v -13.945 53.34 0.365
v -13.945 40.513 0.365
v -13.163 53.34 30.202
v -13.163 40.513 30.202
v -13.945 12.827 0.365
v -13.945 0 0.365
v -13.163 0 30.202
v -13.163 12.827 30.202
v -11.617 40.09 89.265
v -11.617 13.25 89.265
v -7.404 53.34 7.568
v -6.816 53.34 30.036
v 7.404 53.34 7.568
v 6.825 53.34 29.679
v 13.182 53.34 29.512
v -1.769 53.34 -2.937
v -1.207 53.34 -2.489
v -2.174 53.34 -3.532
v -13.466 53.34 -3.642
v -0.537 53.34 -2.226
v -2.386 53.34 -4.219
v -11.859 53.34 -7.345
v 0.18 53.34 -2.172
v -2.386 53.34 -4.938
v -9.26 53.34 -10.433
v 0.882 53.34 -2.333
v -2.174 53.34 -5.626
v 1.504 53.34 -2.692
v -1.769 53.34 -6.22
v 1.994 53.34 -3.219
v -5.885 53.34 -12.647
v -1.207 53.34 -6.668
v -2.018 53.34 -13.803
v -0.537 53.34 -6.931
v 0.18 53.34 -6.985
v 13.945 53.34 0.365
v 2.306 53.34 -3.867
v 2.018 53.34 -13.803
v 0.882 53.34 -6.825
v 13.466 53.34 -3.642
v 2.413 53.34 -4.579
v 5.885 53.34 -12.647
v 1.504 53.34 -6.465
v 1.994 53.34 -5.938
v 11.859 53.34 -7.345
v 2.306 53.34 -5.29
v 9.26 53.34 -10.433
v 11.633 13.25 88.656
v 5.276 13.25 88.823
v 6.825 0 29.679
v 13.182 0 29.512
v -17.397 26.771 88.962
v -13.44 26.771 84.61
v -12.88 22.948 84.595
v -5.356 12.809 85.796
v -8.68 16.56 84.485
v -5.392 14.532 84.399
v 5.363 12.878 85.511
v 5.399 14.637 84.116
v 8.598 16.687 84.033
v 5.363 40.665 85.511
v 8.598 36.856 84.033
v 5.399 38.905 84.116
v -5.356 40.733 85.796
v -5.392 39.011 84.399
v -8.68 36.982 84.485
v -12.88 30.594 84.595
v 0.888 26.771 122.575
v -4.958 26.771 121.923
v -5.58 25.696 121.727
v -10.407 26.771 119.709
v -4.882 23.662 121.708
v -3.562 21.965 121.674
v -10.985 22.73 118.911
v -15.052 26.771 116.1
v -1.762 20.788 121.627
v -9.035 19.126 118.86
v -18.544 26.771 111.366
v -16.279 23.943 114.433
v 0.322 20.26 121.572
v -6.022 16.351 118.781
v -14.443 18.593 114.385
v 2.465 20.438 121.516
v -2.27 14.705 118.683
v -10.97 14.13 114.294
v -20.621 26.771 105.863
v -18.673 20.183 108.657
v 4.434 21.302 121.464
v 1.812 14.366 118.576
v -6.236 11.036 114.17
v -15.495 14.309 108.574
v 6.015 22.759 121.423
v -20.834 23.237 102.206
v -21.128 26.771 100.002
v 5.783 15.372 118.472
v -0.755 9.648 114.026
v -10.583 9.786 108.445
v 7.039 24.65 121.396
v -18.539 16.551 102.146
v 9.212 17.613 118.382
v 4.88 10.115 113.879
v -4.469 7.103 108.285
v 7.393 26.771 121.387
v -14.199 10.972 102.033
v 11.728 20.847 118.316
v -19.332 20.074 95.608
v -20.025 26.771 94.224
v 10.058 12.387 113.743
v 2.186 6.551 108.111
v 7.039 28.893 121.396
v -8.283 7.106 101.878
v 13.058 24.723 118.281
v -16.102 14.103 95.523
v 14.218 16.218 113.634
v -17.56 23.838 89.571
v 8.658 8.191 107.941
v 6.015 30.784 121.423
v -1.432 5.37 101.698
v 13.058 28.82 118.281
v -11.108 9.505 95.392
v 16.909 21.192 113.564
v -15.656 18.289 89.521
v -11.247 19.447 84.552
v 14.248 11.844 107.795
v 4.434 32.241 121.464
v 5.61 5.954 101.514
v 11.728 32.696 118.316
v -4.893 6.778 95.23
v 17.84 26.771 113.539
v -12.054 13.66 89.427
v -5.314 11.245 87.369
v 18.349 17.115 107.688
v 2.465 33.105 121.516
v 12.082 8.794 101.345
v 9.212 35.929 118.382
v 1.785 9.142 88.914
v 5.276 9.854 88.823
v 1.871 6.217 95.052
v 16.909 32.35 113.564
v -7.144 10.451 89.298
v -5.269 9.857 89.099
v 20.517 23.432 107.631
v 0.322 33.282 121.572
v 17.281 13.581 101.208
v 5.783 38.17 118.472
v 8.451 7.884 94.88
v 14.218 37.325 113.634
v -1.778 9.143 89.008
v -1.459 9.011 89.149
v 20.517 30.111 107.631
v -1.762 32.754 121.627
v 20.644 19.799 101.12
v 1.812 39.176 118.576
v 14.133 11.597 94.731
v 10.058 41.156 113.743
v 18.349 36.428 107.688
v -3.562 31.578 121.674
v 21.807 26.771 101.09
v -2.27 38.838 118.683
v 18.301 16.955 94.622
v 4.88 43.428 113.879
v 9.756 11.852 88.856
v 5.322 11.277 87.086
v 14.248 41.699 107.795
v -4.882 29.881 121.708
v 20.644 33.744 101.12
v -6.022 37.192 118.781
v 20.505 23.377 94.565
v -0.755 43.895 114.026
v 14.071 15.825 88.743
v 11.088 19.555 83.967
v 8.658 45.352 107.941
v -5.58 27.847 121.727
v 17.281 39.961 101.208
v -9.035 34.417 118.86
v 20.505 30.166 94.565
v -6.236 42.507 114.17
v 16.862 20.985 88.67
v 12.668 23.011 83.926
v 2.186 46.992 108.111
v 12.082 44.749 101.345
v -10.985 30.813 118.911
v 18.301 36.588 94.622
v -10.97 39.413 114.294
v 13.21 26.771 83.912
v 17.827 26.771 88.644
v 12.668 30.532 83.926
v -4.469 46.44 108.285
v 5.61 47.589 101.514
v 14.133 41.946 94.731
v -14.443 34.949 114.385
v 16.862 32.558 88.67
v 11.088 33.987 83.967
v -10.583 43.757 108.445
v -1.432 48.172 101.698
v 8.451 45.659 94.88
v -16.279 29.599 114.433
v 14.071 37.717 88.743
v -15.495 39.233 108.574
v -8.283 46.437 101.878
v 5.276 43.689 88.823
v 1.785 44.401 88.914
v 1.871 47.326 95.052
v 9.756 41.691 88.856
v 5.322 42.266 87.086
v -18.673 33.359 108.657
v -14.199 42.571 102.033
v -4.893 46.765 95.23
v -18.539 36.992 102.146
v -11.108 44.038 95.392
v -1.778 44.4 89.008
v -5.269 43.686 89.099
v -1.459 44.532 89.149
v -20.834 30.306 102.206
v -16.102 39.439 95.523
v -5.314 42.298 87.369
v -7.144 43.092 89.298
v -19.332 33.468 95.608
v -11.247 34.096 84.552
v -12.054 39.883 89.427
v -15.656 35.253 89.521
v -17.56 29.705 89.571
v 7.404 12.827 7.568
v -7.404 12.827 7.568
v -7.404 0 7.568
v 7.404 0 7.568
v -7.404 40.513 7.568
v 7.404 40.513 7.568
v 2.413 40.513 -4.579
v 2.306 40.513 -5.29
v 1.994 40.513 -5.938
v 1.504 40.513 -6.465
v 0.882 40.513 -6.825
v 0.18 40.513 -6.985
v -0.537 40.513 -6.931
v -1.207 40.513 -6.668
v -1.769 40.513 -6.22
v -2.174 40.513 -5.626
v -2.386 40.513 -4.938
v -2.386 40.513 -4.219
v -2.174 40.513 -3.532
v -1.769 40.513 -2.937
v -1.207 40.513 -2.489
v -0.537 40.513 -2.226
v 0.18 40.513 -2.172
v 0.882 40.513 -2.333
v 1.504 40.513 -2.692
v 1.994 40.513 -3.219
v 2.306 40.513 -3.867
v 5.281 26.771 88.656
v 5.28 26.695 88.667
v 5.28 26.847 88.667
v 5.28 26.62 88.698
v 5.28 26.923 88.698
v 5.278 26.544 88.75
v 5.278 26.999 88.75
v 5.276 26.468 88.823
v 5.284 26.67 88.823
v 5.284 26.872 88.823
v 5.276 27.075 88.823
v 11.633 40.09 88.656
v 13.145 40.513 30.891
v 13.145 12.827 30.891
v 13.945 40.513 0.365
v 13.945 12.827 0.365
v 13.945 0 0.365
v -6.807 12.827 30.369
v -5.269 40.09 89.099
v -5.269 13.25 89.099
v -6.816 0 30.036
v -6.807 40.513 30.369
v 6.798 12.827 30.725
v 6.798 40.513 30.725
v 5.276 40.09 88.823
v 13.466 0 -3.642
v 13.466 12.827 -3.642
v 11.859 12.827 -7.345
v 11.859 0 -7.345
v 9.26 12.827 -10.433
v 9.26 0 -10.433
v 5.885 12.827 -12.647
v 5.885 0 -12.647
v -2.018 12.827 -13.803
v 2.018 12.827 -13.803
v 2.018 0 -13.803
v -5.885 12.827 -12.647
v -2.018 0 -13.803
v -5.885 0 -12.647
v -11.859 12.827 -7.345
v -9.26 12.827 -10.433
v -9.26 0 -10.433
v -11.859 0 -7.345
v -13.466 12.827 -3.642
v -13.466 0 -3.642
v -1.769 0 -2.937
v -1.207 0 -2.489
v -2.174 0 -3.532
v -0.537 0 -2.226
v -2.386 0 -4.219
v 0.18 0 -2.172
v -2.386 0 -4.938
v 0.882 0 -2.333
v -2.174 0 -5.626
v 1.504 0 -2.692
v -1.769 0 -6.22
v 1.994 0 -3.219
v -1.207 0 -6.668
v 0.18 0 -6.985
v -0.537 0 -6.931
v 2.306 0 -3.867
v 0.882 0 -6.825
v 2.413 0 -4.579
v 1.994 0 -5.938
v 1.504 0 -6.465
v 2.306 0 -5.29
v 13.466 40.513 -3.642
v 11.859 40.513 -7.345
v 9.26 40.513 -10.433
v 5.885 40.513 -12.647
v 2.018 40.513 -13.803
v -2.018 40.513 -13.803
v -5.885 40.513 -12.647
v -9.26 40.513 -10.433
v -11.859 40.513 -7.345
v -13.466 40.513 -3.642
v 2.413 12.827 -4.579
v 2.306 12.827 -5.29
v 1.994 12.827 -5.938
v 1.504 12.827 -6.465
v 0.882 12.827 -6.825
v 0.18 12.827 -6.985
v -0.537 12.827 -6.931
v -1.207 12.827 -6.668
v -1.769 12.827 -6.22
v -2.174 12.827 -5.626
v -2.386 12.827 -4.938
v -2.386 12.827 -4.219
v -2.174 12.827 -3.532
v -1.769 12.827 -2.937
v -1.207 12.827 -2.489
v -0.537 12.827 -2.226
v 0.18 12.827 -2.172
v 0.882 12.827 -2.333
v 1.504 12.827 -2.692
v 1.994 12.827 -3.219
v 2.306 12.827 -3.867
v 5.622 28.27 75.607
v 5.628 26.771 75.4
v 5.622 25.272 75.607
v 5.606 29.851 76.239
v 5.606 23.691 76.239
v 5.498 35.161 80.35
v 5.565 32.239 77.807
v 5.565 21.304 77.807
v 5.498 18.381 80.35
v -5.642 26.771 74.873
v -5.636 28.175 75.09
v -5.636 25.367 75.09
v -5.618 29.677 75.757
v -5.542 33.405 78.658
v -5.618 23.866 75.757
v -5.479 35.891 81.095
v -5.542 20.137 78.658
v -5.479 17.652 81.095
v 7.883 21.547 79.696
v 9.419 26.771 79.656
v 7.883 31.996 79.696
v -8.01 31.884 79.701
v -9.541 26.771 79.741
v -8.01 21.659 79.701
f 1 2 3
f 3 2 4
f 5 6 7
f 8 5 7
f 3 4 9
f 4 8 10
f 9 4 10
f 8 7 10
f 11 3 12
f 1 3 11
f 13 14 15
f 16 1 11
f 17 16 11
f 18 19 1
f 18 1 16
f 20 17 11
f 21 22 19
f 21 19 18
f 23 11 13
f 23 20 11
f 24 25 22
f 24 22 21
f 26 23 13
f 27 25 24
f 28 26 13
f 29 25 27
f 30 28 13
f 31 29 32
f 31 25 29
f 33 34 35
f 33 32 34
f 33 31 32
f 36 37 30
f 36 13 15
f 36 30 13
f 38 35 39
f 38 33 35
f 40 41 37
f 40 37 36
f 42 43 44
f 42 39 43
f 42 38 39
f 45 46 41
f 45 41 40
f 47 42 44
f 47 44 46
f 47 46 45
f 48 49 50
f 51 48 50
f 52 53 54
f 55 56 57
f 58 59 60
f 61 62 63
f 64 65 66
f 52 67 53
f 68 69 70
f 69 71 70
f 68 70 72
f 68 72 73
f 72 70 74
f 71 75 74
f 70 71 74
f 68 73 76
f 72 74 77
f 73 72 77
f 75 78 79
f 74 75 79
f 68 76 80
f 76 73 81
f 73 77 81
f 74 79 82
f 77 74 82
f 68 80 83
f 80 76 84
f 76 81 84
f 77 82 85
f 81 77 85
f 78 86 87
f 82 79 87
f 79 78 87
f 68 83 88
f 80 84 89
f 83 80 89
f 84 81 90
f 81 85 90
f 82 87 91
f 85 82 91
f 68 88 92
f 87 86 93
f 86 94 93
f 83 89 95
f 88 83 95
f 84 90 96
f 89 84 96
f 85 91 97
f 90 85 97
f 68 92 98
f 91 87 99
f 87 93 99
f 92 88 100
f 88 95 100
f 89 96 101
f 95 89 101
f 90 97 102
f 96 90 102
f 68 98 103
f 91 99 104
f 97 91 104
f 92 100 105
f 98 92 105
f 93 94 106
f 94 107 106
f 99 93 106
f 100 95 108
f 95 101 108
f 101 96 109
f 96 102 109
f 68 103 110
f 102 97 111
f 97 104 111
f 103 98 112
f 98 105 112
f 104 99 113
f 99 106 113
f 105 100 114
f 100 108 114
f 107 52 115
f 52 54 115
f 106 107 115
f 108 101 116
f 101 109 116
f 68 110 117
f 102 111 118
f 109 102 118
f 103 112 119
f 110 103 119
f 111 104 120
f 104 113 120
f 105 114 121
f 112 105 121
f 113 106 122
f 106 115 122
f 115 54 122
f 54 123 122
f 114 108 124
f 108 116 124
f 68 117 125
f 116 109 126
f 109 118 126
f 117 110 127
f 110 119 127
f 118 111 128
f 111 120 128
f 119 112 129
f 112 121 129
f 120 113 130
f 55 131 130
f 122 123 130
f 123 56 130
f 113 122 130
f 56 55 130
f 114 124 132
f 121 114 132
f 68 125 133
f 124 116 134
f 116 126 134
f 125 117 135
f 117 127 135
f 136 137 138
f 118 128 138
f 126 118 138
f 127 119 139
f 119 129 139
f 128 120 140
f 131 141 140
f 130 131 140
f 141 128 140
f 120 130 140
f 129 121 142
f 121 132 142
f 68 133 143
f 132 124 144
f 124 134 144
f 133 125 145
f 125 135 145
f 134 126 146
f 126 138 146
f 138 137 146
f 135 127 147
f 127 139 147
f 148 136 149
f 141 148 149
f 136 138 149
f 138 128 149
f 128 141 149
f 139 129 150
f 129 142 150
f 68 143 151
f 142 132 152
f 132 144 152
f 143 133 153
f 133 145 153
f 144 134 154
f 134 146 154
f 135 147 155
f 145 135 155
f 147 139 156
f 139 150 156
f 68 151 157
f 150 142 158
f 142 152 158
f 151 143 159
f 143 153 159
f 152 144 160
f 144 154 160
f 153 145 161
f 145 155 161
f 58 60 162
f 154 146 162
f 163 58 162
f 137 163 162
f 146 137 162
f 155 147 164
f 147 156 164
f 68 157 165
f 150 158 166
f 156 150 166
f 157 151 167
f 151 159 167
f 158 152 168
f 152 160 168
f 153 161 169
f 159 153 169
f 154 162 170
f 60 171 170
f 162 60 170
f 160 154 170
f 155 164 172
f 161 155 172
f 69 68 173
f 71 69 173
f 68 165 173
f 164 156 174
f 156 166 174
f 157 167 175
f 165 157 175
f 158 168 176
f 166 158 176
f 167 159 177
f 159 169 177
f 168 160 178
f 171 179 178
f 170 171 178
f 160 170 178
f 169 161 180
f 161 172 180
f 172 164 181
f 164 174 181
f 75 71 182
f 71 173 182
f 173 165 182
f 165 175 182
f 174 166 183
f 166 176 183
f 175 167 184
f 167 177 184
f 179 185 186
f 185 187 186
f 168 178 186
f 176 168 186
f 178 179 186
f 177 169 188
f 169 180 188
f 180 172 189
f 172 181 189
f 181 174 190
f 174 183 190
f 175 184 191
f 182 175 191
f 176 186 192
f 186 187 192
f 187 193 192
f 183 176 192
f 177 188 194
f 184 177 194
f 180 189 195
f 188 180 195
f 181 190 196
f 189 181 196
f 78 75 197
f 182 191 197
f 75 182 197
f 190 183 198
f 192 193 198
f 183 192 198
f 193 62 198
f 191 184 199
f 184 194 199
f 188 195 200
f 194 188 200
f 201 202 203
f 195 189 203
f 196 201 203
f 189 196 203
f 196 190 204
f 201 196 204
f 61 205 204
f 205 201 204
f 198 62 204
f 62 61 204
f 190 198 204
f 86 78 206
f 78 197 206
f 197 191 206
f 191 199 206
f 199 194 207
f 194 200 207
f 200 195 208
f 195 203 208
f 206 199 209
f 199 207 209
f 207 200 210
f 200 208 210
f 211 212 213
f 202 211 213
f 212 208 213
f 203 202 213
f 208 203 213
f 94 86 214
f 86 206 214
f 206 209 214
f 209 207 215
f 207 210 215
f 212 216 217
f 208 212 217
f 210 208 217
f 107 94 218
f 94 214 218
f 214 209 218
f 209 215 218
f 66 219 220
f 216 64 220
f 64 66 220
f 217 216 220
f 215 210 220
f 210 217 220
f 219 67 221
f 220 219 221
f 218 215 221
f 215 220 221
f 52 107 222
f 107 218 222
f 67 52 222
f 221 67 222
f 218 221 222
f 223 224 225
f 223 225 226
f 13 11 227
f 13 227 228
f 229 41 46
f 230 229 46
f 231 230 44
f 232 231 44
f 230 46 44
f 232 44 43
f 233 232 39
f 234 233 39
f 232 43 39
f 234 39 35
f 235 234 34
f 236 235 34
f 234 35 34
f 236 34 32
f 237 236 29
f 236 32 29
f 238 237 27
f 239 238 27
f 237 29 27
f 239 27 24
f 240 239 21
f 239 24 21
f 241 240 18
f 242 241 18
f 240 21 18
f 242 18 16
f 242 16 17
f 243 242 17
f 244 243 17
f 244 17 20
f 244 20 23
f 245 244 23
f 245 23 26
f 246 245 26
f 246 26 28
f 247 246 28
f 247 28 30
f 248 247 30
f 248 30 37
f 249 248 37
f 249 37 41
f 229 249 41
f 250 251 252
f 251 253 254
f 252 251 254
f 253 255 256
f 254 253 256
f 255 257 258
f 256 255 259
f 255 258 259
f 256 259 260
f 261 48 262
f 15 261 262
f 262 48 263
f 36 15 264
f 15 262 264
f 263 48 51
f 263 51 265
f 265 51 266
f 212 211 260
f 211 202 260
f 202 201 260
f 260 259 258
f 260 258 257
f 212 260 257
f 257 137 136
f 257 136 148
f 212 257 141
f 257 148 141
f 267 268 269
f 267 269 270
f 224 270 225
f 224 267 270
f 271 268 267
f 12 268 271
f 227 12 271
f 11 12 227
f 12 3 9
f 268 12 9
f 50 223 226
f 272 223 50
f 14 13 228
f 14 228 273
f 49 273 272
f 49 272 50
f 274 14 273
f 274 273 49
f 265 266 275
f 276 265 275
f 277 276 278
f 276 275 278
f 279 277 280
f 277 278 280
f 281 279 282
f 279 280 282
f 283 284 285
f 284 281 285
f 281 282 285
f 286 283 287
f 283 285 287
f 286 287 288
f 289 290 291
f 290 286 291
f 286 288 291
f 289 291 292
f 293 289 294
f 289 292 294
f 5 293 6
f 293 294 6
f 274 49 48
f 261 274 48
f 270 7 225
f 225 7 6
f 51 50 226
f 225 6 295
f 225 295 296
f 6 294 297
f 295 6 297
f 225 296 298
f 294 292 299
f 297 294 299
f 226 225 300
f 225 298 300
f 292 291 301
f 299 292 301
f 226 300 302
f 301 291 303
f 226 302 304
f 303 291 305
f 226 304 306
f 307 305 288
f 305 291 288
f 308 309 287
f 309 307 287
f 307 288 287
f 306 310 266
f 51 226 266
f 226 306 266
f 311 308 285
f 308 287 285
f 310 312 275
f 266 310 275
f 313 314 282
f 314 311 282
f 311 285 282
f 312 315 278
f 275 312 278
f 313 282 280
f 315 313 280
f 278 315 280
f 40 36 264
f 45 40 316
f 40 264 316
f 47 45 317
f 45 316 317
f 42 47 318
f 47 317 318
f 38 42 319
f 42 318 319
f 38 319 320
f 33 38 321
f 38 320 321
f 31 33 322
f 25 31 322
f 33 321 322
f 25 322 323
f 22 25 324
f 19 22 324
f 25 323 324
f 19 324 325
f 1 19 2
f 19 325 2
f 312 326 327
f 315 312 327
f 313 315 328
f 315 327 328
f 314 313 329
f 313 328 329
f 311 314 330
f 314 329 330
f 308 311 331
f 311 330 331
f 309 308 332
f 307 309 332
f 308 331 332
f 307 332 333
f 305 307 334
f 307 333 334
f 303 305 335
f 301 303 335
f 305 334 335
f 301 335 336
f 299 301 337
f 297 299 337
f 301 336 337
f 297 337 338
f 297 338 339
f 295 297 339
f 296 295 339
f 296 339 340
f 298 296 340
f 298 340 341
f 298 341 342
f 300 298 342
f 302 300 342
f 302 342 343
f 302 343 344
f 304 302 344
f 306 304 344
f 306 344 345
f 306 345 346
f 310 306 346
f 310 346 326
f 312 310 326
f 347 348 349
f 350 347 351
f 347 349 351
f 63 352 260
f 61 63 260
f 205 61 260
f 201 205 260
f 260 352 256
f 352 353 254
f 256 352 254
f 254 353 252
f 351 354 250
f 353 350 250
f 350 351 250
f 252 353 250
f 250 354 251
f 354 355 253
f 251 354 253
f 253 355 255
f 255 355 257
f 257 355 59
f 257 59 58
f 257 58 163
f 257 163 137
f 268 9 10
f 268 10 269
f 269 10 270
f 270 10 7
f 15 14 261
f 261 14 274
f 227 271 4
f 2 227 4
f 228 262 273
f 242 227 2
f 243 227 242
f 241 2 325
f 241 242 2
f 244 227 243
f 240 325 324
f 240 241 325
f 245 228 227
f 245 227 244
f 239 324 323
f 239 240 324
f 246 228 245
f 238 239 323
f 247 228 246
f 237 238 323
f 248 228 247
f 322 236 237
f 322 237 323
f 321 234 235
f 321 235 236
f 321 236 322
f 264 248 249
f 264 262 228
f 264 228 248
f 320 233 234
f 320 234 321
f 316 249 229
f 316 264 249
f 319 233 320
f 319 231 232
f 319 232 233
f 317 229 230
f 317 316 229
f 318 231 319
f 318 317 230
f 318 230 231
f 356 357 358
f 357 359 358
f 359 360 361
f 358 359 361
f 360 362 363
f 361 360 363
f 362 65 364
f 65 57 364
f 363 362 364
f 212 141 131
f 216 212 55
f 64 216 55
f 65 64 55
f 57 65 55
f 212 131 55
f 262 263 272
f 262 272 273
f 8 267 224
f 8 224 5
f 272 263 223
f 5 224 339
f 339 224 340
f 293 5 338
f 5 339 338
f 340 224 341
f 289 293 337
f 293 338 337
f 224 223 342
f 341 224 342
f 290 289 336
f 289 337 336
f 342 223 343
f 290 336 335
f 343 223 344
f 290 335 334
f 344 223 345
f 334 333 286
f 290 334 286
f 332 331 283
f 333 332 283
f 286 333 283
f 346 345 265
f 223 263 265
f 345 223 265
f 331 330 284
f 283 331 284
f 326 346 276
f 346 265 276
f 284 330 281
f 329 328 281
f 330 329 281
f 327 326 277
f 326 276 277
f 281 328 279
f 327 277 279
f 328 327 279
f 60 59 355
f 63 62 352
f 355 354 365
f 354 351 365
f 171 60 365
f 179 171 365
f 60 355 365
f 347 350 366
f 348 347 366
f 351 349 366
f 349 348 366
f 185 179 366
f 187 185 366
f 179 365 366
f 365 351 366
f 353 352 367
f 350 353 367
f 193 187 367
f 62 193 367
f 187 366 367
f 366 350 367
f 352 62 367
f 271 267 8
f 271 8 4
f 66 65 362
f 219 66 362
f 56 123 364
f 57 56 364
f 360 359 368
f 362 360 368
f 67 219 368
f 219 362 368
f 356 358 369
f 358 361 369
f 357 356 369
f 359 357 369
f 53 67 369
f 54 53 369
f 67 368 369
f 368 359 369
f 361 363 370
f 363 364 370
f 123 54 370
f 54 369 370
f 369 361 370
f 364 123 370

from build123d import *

# Parameters (mm, degrees)
BOSS_EXTRUDE1_DEPTH      = 53.34
SKETCH4_W                = 61.072672184
SKETCH4_H                = 27.686
CUT_EXTRUDE3_DEPTH       = 125.557157077
SKETCH5_OUTSIDE_W        = 57.352
SKETCH5_OUTSIDE_H        = 152.814
CUT_EXTRUDE5_DEPTH       = 123.51837945
SKETCH6_R                = 2.413
CUT_EXTRUDE6_DEPTH       = 123.51837945
CUT_EXTRUDE8_DEPTH       = 100
CUT_EXTRUDE8_DEPTH_BACK  = 100
CUT_EXTRUDE9_DEPTH       = 100
CUT_EXTRUDE10_DEPTH      = 128.352835601
CUT_EXTRUDE10_DEPTH_BACK = 128.352835601


with BuildPart() as part:
    # Sketch1 → Boss-Extrude1 (new body)
    with BuildSketch(Plane(origin=(0, 0, 0), x_dir=(1, 0, 0), z_dir=(0, 1, 0))):
        with BuildLine():
            Line((-13.944778991, -0.365156889), (-11.616850564, -89.265156889))
            ThreePointArc((-11.616850564, -89.265156889), (0, -109.412099434), (11.616850564, -89.265156889))
            Line((11.616850564, -89.265156889), (13.944778991, -0.365156889))
            ThreePointArc((13.944778991, -0.365156889), (0, 13.949559157), (-13.944778991, -0.365156889))
        make_face()
    extrude(amount=BOSS_EXTRUDE1_DEPTH)

    # Sketch4 → Cut-Extrude3 (cut, through all)
    with BuildSketch(Plane(origin=(13.944778991, 0, 0.365156889), x_dir=(0.026176948307873094, 0, -0.9996573249755574), z_dir=(0.9996573249755573, 0, 0.02617694830787309))):
        with Locations((0, 26.67)):
            Rectangle(SKETCH4_W, SKETCH4_H)
    extrude(amount=-CUT_EXTRUDE3_DEPTH, mode=Mode.SUBTRACT)

    # Sketch5 outside → Cut-Extrude5 (cut, through all)
    # profile 1 of 2: a face of its own
    with BuildSketch(Plane(origin=(0, 53.34, 0), x_dir=(1, 0, 0), z_dir=(0, 1, 0))):
        with Locations((0, -47.731)):
            Rectangle(SKETCH5_OUTSIDE_W, SKETCH5_OUTSIDE_H)
        with BuildLine():
            Line((-13.944778991, -0.365156889), (-11.616850564, -89.265156889))
            ThreePointArc((-11.616850564, -89.265156889), (0, -109.412099434), (11.616850564, -89.265156889))
            Line((11.616850564, -89.265156889), (13.944778991, -0.365156889))
            ThreePointArc((13.944778991, -0.365156889), (0, 13.949559157), (-13.944778991, -0.365156889))
        make_face(mode=Mode.SUBTRACT)
    # profile 2 of 2: a face of its own
    with BuildSketch(Plane(origin=(0, 53.34, 0), x_dir=(1, 0, 0), z_dir=(0, 1, 0))):
        with BuildLine():
            Line((7.403977553, -7.568443783), (5.213735587, -91.210409969))
            ThreePointArc((5.213735587, -91.210409969), (0, -105.33899845), (-5.213735587, -91.210409969))
            Line((-5.213735587, -91.210409969), (-7.403977553, -7.568443783))
            Line((-7.403977553, -7.568443783), (7.403977553, -7.568443783))
        make_face()
    extrude(amount=-CUT_EXTRUDE5_DEPTH, mode=Mode.SUBTRACT)

    # Sketch6 → Cut-Extrude6 (cut, through all)
    with BuildSketch(Plane(origin=(0, 53.34, 0), x_dir=(1, 0, 0), z_dir=(0, 1, 0))):
        with Locations((0, 4.57874024)):
            Circle(SKETCH6_R)
    extrude(amount=-CUT_EXTRUDE6_DEPTH, mode=Mode.SUBTRACT)

    # Sketch7 → Cut-Extrude8 (cut, two sides: drawn at the far end of the back side and taken through both)
    with BuildSketch(Plane(origin=(-13.944778991, 0, 0.365156889), x_dir=(0.02617694830787368, 0, 0.9996573249755574), z_dir=(-0.9996573249755574, 0, 0.02617694830787368)).offset(-CUT_EXTRUDE8_DEPTH_BACK)):
        Polygon((138.702727396, 53.34), (29.847177093, 53.34), (88.930474252, 40.09), (115.196693912, 40.09), (115.196693912, 13.25), (88.930474252, 13.25), (29.847177093, 0), (138.702727396, 0), align=None)
    extrude(amount=CUT_EXTRUDE8_DEPTH + CUT_EXTRUDE8_DEPTH_BACK, mode=Mode.SUBTRACT)

    # Sketch8 → Cut-Extrude9 (cut)
    with BuildSketch(Plane(origin=(0, 40.09, 0), x_dir=(1, 0, 0), z_dir=(0, 1, 0))):
        Polygon((-11.616850564, -89.265156889), (19.748470708, -88.443827046), (21.136276119, -119.73242467), (-27.769338844, -116.21935592), (-20.465853811, -89.265156889), align=None)
    extrude(amount=-CUT_EXTRUDE9_DEPTH, mode=Mode.SUBTRACT)


with BuildPart() as body_2:
    # Sketch14 → Revolve2 (revolve)
    with BuildSketch(Plane(origin=(0, 26.771336555, 0), x_dir=(-0.9996573249755574, 0, 0.02617694830787441), z_dir=(0, 1, 0))):
        with BuildLine():
            Line((7.599559157, 88.930474252), (2.320752522, 88.930474252))
            Line((2.320752522, 88.930474252), (2.320752522, 122.556421305))
            ThreePointArc((2.320752522, 122.556421305), (22.610323818, 108.131020534), (15.64993494, 84.228889302))
            Line((15.64993494, 84.228889302), (7.599559157, 74.699423181))
            Line((7.599559157, 74.699423181), (7.599559157, 88.930474252))
        make_face()
    revolve(axis=Axis((-1.162589714, 26.771336555, 44.258833564), (0.026176948307875366, 0, 0.9996573249755573)))

    # Sketch21 → Cut-Extrude10 (cut, two sides: drawn at the far end of the back side and taken through both)
    with BuildSketch(Plane(origin=(0, 26.771336555, 0), x_dir=(-0.9996573249755574, 0, 0.02617694830787441), z_dir=(0, 1, 0)).offset(-CUT_EXTRUDE10_DEPTH_BACK)):
        Polygon((7.599559157, 74.699423181), (-3.695157498, 74.699423181), (-2.949339715, 88.930474252), (7.599559157, 88.930474252), align=None)
    extrude(amount=CUT_EXTRUDE10_DEPTH + CUT_EXTRUDE10_DEPTH_BACK, mode=Mode.SUBTRACT)


solid = Compound([part.part, body_2.part])
